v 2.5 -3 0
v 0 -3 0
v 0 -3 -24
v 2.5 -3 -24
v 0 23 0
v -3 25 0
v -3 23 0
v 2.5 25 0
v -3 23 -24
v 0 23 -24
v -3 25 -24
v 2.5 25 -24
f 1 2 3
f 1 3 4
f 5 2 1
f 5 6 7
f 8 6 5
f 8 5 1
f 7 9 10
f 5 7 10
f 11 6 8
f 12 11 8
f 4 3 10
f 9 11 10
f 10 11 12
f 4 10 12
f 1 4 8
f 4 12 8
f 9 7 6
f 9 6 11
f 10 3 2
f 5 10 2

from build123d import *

# Parameters (mm, degrees)
SKETCH1_W           = 3
SKETCH1_H           = 24
BOSS_EXTRUDE1_DEPTH = 23
SKETCH2_W           = 6
SKETCH2_H           = 24
BOSS_EXTRUDE2_DEPTH = 2
SKETCH4_W           = 3
SKETCH4_H           = 24
BOSS_EXTRUDE3_DEPTH = 2
SKETCH5_W           = 24
SKETCH5_H           = 27
CUT_EXTRUDE1_DEPTH  = 0.5
SKETCH6_W           = 2.5
SKETCH6_H           = 24
BOSS_EXTRUDE4_DEPTH = 1


with BuildPart() as part:
    # Sketch1 → Boss-Extrude1 (new body)
    with BuildSketch(Plane(origin=(0, 0, 0), x_dir=(1, 0, 0), z_dir=(0, 1, 0))):
        with Locations((1.5, 12)):
            Rectangle(SKETCH1_W, SKETCH1_H)
    extrude(amount=BOSS_EXTRUDE1_DEPTH)

    # Sketch2 → Boss-Extrude2 (add)
    with BuildSketch(Plane(origin=(0, 23, 0), x_dir=(1, 0, 0), z_dir=(0, 1, 0))):
        with Locations((0, 12)):
            Rectangle(SKETCH2_W, SKETCH2_H)
    extrude(amount=BOSS_EXTRUDE2_DEPTH)

    # Sketch4 → Boss-Extrude3 (add)
    with BuildSketch(Plane.XZ):
        with Locations((1.5, -12)):
            Rectangle(SKETCH4_W, SKETCH4_H)
    extrude(amount=BOSS_EXTRUDE3_DEPTH)

    # Sketch5 → Cut-Extrude1 (cut)
    with BuildSketch(Plane(origin=(3, 0, 0), x_dir=(0, 0, -1), z_dir=(1, 0, 0))):
        with Locations((12, 11.5)):
            Rectangle(SKETCH5_W, SKETCH5_H)
    extrude(amount=-CUT_EXTRUDE1_DEPTH, mode=Mode.SUBTRACT)

    # Sketch6 → Boss-Extrude4 (add)
    with BuildSketch(Plane.XZ.offset(2)):
        with Locations((1.25, -12)):
            Rectangle(SKETCH6_W, SKETCH6_H)
    extrude(amount=BOSS_EXTRUDE4_DEPTH)


solid = part.part
